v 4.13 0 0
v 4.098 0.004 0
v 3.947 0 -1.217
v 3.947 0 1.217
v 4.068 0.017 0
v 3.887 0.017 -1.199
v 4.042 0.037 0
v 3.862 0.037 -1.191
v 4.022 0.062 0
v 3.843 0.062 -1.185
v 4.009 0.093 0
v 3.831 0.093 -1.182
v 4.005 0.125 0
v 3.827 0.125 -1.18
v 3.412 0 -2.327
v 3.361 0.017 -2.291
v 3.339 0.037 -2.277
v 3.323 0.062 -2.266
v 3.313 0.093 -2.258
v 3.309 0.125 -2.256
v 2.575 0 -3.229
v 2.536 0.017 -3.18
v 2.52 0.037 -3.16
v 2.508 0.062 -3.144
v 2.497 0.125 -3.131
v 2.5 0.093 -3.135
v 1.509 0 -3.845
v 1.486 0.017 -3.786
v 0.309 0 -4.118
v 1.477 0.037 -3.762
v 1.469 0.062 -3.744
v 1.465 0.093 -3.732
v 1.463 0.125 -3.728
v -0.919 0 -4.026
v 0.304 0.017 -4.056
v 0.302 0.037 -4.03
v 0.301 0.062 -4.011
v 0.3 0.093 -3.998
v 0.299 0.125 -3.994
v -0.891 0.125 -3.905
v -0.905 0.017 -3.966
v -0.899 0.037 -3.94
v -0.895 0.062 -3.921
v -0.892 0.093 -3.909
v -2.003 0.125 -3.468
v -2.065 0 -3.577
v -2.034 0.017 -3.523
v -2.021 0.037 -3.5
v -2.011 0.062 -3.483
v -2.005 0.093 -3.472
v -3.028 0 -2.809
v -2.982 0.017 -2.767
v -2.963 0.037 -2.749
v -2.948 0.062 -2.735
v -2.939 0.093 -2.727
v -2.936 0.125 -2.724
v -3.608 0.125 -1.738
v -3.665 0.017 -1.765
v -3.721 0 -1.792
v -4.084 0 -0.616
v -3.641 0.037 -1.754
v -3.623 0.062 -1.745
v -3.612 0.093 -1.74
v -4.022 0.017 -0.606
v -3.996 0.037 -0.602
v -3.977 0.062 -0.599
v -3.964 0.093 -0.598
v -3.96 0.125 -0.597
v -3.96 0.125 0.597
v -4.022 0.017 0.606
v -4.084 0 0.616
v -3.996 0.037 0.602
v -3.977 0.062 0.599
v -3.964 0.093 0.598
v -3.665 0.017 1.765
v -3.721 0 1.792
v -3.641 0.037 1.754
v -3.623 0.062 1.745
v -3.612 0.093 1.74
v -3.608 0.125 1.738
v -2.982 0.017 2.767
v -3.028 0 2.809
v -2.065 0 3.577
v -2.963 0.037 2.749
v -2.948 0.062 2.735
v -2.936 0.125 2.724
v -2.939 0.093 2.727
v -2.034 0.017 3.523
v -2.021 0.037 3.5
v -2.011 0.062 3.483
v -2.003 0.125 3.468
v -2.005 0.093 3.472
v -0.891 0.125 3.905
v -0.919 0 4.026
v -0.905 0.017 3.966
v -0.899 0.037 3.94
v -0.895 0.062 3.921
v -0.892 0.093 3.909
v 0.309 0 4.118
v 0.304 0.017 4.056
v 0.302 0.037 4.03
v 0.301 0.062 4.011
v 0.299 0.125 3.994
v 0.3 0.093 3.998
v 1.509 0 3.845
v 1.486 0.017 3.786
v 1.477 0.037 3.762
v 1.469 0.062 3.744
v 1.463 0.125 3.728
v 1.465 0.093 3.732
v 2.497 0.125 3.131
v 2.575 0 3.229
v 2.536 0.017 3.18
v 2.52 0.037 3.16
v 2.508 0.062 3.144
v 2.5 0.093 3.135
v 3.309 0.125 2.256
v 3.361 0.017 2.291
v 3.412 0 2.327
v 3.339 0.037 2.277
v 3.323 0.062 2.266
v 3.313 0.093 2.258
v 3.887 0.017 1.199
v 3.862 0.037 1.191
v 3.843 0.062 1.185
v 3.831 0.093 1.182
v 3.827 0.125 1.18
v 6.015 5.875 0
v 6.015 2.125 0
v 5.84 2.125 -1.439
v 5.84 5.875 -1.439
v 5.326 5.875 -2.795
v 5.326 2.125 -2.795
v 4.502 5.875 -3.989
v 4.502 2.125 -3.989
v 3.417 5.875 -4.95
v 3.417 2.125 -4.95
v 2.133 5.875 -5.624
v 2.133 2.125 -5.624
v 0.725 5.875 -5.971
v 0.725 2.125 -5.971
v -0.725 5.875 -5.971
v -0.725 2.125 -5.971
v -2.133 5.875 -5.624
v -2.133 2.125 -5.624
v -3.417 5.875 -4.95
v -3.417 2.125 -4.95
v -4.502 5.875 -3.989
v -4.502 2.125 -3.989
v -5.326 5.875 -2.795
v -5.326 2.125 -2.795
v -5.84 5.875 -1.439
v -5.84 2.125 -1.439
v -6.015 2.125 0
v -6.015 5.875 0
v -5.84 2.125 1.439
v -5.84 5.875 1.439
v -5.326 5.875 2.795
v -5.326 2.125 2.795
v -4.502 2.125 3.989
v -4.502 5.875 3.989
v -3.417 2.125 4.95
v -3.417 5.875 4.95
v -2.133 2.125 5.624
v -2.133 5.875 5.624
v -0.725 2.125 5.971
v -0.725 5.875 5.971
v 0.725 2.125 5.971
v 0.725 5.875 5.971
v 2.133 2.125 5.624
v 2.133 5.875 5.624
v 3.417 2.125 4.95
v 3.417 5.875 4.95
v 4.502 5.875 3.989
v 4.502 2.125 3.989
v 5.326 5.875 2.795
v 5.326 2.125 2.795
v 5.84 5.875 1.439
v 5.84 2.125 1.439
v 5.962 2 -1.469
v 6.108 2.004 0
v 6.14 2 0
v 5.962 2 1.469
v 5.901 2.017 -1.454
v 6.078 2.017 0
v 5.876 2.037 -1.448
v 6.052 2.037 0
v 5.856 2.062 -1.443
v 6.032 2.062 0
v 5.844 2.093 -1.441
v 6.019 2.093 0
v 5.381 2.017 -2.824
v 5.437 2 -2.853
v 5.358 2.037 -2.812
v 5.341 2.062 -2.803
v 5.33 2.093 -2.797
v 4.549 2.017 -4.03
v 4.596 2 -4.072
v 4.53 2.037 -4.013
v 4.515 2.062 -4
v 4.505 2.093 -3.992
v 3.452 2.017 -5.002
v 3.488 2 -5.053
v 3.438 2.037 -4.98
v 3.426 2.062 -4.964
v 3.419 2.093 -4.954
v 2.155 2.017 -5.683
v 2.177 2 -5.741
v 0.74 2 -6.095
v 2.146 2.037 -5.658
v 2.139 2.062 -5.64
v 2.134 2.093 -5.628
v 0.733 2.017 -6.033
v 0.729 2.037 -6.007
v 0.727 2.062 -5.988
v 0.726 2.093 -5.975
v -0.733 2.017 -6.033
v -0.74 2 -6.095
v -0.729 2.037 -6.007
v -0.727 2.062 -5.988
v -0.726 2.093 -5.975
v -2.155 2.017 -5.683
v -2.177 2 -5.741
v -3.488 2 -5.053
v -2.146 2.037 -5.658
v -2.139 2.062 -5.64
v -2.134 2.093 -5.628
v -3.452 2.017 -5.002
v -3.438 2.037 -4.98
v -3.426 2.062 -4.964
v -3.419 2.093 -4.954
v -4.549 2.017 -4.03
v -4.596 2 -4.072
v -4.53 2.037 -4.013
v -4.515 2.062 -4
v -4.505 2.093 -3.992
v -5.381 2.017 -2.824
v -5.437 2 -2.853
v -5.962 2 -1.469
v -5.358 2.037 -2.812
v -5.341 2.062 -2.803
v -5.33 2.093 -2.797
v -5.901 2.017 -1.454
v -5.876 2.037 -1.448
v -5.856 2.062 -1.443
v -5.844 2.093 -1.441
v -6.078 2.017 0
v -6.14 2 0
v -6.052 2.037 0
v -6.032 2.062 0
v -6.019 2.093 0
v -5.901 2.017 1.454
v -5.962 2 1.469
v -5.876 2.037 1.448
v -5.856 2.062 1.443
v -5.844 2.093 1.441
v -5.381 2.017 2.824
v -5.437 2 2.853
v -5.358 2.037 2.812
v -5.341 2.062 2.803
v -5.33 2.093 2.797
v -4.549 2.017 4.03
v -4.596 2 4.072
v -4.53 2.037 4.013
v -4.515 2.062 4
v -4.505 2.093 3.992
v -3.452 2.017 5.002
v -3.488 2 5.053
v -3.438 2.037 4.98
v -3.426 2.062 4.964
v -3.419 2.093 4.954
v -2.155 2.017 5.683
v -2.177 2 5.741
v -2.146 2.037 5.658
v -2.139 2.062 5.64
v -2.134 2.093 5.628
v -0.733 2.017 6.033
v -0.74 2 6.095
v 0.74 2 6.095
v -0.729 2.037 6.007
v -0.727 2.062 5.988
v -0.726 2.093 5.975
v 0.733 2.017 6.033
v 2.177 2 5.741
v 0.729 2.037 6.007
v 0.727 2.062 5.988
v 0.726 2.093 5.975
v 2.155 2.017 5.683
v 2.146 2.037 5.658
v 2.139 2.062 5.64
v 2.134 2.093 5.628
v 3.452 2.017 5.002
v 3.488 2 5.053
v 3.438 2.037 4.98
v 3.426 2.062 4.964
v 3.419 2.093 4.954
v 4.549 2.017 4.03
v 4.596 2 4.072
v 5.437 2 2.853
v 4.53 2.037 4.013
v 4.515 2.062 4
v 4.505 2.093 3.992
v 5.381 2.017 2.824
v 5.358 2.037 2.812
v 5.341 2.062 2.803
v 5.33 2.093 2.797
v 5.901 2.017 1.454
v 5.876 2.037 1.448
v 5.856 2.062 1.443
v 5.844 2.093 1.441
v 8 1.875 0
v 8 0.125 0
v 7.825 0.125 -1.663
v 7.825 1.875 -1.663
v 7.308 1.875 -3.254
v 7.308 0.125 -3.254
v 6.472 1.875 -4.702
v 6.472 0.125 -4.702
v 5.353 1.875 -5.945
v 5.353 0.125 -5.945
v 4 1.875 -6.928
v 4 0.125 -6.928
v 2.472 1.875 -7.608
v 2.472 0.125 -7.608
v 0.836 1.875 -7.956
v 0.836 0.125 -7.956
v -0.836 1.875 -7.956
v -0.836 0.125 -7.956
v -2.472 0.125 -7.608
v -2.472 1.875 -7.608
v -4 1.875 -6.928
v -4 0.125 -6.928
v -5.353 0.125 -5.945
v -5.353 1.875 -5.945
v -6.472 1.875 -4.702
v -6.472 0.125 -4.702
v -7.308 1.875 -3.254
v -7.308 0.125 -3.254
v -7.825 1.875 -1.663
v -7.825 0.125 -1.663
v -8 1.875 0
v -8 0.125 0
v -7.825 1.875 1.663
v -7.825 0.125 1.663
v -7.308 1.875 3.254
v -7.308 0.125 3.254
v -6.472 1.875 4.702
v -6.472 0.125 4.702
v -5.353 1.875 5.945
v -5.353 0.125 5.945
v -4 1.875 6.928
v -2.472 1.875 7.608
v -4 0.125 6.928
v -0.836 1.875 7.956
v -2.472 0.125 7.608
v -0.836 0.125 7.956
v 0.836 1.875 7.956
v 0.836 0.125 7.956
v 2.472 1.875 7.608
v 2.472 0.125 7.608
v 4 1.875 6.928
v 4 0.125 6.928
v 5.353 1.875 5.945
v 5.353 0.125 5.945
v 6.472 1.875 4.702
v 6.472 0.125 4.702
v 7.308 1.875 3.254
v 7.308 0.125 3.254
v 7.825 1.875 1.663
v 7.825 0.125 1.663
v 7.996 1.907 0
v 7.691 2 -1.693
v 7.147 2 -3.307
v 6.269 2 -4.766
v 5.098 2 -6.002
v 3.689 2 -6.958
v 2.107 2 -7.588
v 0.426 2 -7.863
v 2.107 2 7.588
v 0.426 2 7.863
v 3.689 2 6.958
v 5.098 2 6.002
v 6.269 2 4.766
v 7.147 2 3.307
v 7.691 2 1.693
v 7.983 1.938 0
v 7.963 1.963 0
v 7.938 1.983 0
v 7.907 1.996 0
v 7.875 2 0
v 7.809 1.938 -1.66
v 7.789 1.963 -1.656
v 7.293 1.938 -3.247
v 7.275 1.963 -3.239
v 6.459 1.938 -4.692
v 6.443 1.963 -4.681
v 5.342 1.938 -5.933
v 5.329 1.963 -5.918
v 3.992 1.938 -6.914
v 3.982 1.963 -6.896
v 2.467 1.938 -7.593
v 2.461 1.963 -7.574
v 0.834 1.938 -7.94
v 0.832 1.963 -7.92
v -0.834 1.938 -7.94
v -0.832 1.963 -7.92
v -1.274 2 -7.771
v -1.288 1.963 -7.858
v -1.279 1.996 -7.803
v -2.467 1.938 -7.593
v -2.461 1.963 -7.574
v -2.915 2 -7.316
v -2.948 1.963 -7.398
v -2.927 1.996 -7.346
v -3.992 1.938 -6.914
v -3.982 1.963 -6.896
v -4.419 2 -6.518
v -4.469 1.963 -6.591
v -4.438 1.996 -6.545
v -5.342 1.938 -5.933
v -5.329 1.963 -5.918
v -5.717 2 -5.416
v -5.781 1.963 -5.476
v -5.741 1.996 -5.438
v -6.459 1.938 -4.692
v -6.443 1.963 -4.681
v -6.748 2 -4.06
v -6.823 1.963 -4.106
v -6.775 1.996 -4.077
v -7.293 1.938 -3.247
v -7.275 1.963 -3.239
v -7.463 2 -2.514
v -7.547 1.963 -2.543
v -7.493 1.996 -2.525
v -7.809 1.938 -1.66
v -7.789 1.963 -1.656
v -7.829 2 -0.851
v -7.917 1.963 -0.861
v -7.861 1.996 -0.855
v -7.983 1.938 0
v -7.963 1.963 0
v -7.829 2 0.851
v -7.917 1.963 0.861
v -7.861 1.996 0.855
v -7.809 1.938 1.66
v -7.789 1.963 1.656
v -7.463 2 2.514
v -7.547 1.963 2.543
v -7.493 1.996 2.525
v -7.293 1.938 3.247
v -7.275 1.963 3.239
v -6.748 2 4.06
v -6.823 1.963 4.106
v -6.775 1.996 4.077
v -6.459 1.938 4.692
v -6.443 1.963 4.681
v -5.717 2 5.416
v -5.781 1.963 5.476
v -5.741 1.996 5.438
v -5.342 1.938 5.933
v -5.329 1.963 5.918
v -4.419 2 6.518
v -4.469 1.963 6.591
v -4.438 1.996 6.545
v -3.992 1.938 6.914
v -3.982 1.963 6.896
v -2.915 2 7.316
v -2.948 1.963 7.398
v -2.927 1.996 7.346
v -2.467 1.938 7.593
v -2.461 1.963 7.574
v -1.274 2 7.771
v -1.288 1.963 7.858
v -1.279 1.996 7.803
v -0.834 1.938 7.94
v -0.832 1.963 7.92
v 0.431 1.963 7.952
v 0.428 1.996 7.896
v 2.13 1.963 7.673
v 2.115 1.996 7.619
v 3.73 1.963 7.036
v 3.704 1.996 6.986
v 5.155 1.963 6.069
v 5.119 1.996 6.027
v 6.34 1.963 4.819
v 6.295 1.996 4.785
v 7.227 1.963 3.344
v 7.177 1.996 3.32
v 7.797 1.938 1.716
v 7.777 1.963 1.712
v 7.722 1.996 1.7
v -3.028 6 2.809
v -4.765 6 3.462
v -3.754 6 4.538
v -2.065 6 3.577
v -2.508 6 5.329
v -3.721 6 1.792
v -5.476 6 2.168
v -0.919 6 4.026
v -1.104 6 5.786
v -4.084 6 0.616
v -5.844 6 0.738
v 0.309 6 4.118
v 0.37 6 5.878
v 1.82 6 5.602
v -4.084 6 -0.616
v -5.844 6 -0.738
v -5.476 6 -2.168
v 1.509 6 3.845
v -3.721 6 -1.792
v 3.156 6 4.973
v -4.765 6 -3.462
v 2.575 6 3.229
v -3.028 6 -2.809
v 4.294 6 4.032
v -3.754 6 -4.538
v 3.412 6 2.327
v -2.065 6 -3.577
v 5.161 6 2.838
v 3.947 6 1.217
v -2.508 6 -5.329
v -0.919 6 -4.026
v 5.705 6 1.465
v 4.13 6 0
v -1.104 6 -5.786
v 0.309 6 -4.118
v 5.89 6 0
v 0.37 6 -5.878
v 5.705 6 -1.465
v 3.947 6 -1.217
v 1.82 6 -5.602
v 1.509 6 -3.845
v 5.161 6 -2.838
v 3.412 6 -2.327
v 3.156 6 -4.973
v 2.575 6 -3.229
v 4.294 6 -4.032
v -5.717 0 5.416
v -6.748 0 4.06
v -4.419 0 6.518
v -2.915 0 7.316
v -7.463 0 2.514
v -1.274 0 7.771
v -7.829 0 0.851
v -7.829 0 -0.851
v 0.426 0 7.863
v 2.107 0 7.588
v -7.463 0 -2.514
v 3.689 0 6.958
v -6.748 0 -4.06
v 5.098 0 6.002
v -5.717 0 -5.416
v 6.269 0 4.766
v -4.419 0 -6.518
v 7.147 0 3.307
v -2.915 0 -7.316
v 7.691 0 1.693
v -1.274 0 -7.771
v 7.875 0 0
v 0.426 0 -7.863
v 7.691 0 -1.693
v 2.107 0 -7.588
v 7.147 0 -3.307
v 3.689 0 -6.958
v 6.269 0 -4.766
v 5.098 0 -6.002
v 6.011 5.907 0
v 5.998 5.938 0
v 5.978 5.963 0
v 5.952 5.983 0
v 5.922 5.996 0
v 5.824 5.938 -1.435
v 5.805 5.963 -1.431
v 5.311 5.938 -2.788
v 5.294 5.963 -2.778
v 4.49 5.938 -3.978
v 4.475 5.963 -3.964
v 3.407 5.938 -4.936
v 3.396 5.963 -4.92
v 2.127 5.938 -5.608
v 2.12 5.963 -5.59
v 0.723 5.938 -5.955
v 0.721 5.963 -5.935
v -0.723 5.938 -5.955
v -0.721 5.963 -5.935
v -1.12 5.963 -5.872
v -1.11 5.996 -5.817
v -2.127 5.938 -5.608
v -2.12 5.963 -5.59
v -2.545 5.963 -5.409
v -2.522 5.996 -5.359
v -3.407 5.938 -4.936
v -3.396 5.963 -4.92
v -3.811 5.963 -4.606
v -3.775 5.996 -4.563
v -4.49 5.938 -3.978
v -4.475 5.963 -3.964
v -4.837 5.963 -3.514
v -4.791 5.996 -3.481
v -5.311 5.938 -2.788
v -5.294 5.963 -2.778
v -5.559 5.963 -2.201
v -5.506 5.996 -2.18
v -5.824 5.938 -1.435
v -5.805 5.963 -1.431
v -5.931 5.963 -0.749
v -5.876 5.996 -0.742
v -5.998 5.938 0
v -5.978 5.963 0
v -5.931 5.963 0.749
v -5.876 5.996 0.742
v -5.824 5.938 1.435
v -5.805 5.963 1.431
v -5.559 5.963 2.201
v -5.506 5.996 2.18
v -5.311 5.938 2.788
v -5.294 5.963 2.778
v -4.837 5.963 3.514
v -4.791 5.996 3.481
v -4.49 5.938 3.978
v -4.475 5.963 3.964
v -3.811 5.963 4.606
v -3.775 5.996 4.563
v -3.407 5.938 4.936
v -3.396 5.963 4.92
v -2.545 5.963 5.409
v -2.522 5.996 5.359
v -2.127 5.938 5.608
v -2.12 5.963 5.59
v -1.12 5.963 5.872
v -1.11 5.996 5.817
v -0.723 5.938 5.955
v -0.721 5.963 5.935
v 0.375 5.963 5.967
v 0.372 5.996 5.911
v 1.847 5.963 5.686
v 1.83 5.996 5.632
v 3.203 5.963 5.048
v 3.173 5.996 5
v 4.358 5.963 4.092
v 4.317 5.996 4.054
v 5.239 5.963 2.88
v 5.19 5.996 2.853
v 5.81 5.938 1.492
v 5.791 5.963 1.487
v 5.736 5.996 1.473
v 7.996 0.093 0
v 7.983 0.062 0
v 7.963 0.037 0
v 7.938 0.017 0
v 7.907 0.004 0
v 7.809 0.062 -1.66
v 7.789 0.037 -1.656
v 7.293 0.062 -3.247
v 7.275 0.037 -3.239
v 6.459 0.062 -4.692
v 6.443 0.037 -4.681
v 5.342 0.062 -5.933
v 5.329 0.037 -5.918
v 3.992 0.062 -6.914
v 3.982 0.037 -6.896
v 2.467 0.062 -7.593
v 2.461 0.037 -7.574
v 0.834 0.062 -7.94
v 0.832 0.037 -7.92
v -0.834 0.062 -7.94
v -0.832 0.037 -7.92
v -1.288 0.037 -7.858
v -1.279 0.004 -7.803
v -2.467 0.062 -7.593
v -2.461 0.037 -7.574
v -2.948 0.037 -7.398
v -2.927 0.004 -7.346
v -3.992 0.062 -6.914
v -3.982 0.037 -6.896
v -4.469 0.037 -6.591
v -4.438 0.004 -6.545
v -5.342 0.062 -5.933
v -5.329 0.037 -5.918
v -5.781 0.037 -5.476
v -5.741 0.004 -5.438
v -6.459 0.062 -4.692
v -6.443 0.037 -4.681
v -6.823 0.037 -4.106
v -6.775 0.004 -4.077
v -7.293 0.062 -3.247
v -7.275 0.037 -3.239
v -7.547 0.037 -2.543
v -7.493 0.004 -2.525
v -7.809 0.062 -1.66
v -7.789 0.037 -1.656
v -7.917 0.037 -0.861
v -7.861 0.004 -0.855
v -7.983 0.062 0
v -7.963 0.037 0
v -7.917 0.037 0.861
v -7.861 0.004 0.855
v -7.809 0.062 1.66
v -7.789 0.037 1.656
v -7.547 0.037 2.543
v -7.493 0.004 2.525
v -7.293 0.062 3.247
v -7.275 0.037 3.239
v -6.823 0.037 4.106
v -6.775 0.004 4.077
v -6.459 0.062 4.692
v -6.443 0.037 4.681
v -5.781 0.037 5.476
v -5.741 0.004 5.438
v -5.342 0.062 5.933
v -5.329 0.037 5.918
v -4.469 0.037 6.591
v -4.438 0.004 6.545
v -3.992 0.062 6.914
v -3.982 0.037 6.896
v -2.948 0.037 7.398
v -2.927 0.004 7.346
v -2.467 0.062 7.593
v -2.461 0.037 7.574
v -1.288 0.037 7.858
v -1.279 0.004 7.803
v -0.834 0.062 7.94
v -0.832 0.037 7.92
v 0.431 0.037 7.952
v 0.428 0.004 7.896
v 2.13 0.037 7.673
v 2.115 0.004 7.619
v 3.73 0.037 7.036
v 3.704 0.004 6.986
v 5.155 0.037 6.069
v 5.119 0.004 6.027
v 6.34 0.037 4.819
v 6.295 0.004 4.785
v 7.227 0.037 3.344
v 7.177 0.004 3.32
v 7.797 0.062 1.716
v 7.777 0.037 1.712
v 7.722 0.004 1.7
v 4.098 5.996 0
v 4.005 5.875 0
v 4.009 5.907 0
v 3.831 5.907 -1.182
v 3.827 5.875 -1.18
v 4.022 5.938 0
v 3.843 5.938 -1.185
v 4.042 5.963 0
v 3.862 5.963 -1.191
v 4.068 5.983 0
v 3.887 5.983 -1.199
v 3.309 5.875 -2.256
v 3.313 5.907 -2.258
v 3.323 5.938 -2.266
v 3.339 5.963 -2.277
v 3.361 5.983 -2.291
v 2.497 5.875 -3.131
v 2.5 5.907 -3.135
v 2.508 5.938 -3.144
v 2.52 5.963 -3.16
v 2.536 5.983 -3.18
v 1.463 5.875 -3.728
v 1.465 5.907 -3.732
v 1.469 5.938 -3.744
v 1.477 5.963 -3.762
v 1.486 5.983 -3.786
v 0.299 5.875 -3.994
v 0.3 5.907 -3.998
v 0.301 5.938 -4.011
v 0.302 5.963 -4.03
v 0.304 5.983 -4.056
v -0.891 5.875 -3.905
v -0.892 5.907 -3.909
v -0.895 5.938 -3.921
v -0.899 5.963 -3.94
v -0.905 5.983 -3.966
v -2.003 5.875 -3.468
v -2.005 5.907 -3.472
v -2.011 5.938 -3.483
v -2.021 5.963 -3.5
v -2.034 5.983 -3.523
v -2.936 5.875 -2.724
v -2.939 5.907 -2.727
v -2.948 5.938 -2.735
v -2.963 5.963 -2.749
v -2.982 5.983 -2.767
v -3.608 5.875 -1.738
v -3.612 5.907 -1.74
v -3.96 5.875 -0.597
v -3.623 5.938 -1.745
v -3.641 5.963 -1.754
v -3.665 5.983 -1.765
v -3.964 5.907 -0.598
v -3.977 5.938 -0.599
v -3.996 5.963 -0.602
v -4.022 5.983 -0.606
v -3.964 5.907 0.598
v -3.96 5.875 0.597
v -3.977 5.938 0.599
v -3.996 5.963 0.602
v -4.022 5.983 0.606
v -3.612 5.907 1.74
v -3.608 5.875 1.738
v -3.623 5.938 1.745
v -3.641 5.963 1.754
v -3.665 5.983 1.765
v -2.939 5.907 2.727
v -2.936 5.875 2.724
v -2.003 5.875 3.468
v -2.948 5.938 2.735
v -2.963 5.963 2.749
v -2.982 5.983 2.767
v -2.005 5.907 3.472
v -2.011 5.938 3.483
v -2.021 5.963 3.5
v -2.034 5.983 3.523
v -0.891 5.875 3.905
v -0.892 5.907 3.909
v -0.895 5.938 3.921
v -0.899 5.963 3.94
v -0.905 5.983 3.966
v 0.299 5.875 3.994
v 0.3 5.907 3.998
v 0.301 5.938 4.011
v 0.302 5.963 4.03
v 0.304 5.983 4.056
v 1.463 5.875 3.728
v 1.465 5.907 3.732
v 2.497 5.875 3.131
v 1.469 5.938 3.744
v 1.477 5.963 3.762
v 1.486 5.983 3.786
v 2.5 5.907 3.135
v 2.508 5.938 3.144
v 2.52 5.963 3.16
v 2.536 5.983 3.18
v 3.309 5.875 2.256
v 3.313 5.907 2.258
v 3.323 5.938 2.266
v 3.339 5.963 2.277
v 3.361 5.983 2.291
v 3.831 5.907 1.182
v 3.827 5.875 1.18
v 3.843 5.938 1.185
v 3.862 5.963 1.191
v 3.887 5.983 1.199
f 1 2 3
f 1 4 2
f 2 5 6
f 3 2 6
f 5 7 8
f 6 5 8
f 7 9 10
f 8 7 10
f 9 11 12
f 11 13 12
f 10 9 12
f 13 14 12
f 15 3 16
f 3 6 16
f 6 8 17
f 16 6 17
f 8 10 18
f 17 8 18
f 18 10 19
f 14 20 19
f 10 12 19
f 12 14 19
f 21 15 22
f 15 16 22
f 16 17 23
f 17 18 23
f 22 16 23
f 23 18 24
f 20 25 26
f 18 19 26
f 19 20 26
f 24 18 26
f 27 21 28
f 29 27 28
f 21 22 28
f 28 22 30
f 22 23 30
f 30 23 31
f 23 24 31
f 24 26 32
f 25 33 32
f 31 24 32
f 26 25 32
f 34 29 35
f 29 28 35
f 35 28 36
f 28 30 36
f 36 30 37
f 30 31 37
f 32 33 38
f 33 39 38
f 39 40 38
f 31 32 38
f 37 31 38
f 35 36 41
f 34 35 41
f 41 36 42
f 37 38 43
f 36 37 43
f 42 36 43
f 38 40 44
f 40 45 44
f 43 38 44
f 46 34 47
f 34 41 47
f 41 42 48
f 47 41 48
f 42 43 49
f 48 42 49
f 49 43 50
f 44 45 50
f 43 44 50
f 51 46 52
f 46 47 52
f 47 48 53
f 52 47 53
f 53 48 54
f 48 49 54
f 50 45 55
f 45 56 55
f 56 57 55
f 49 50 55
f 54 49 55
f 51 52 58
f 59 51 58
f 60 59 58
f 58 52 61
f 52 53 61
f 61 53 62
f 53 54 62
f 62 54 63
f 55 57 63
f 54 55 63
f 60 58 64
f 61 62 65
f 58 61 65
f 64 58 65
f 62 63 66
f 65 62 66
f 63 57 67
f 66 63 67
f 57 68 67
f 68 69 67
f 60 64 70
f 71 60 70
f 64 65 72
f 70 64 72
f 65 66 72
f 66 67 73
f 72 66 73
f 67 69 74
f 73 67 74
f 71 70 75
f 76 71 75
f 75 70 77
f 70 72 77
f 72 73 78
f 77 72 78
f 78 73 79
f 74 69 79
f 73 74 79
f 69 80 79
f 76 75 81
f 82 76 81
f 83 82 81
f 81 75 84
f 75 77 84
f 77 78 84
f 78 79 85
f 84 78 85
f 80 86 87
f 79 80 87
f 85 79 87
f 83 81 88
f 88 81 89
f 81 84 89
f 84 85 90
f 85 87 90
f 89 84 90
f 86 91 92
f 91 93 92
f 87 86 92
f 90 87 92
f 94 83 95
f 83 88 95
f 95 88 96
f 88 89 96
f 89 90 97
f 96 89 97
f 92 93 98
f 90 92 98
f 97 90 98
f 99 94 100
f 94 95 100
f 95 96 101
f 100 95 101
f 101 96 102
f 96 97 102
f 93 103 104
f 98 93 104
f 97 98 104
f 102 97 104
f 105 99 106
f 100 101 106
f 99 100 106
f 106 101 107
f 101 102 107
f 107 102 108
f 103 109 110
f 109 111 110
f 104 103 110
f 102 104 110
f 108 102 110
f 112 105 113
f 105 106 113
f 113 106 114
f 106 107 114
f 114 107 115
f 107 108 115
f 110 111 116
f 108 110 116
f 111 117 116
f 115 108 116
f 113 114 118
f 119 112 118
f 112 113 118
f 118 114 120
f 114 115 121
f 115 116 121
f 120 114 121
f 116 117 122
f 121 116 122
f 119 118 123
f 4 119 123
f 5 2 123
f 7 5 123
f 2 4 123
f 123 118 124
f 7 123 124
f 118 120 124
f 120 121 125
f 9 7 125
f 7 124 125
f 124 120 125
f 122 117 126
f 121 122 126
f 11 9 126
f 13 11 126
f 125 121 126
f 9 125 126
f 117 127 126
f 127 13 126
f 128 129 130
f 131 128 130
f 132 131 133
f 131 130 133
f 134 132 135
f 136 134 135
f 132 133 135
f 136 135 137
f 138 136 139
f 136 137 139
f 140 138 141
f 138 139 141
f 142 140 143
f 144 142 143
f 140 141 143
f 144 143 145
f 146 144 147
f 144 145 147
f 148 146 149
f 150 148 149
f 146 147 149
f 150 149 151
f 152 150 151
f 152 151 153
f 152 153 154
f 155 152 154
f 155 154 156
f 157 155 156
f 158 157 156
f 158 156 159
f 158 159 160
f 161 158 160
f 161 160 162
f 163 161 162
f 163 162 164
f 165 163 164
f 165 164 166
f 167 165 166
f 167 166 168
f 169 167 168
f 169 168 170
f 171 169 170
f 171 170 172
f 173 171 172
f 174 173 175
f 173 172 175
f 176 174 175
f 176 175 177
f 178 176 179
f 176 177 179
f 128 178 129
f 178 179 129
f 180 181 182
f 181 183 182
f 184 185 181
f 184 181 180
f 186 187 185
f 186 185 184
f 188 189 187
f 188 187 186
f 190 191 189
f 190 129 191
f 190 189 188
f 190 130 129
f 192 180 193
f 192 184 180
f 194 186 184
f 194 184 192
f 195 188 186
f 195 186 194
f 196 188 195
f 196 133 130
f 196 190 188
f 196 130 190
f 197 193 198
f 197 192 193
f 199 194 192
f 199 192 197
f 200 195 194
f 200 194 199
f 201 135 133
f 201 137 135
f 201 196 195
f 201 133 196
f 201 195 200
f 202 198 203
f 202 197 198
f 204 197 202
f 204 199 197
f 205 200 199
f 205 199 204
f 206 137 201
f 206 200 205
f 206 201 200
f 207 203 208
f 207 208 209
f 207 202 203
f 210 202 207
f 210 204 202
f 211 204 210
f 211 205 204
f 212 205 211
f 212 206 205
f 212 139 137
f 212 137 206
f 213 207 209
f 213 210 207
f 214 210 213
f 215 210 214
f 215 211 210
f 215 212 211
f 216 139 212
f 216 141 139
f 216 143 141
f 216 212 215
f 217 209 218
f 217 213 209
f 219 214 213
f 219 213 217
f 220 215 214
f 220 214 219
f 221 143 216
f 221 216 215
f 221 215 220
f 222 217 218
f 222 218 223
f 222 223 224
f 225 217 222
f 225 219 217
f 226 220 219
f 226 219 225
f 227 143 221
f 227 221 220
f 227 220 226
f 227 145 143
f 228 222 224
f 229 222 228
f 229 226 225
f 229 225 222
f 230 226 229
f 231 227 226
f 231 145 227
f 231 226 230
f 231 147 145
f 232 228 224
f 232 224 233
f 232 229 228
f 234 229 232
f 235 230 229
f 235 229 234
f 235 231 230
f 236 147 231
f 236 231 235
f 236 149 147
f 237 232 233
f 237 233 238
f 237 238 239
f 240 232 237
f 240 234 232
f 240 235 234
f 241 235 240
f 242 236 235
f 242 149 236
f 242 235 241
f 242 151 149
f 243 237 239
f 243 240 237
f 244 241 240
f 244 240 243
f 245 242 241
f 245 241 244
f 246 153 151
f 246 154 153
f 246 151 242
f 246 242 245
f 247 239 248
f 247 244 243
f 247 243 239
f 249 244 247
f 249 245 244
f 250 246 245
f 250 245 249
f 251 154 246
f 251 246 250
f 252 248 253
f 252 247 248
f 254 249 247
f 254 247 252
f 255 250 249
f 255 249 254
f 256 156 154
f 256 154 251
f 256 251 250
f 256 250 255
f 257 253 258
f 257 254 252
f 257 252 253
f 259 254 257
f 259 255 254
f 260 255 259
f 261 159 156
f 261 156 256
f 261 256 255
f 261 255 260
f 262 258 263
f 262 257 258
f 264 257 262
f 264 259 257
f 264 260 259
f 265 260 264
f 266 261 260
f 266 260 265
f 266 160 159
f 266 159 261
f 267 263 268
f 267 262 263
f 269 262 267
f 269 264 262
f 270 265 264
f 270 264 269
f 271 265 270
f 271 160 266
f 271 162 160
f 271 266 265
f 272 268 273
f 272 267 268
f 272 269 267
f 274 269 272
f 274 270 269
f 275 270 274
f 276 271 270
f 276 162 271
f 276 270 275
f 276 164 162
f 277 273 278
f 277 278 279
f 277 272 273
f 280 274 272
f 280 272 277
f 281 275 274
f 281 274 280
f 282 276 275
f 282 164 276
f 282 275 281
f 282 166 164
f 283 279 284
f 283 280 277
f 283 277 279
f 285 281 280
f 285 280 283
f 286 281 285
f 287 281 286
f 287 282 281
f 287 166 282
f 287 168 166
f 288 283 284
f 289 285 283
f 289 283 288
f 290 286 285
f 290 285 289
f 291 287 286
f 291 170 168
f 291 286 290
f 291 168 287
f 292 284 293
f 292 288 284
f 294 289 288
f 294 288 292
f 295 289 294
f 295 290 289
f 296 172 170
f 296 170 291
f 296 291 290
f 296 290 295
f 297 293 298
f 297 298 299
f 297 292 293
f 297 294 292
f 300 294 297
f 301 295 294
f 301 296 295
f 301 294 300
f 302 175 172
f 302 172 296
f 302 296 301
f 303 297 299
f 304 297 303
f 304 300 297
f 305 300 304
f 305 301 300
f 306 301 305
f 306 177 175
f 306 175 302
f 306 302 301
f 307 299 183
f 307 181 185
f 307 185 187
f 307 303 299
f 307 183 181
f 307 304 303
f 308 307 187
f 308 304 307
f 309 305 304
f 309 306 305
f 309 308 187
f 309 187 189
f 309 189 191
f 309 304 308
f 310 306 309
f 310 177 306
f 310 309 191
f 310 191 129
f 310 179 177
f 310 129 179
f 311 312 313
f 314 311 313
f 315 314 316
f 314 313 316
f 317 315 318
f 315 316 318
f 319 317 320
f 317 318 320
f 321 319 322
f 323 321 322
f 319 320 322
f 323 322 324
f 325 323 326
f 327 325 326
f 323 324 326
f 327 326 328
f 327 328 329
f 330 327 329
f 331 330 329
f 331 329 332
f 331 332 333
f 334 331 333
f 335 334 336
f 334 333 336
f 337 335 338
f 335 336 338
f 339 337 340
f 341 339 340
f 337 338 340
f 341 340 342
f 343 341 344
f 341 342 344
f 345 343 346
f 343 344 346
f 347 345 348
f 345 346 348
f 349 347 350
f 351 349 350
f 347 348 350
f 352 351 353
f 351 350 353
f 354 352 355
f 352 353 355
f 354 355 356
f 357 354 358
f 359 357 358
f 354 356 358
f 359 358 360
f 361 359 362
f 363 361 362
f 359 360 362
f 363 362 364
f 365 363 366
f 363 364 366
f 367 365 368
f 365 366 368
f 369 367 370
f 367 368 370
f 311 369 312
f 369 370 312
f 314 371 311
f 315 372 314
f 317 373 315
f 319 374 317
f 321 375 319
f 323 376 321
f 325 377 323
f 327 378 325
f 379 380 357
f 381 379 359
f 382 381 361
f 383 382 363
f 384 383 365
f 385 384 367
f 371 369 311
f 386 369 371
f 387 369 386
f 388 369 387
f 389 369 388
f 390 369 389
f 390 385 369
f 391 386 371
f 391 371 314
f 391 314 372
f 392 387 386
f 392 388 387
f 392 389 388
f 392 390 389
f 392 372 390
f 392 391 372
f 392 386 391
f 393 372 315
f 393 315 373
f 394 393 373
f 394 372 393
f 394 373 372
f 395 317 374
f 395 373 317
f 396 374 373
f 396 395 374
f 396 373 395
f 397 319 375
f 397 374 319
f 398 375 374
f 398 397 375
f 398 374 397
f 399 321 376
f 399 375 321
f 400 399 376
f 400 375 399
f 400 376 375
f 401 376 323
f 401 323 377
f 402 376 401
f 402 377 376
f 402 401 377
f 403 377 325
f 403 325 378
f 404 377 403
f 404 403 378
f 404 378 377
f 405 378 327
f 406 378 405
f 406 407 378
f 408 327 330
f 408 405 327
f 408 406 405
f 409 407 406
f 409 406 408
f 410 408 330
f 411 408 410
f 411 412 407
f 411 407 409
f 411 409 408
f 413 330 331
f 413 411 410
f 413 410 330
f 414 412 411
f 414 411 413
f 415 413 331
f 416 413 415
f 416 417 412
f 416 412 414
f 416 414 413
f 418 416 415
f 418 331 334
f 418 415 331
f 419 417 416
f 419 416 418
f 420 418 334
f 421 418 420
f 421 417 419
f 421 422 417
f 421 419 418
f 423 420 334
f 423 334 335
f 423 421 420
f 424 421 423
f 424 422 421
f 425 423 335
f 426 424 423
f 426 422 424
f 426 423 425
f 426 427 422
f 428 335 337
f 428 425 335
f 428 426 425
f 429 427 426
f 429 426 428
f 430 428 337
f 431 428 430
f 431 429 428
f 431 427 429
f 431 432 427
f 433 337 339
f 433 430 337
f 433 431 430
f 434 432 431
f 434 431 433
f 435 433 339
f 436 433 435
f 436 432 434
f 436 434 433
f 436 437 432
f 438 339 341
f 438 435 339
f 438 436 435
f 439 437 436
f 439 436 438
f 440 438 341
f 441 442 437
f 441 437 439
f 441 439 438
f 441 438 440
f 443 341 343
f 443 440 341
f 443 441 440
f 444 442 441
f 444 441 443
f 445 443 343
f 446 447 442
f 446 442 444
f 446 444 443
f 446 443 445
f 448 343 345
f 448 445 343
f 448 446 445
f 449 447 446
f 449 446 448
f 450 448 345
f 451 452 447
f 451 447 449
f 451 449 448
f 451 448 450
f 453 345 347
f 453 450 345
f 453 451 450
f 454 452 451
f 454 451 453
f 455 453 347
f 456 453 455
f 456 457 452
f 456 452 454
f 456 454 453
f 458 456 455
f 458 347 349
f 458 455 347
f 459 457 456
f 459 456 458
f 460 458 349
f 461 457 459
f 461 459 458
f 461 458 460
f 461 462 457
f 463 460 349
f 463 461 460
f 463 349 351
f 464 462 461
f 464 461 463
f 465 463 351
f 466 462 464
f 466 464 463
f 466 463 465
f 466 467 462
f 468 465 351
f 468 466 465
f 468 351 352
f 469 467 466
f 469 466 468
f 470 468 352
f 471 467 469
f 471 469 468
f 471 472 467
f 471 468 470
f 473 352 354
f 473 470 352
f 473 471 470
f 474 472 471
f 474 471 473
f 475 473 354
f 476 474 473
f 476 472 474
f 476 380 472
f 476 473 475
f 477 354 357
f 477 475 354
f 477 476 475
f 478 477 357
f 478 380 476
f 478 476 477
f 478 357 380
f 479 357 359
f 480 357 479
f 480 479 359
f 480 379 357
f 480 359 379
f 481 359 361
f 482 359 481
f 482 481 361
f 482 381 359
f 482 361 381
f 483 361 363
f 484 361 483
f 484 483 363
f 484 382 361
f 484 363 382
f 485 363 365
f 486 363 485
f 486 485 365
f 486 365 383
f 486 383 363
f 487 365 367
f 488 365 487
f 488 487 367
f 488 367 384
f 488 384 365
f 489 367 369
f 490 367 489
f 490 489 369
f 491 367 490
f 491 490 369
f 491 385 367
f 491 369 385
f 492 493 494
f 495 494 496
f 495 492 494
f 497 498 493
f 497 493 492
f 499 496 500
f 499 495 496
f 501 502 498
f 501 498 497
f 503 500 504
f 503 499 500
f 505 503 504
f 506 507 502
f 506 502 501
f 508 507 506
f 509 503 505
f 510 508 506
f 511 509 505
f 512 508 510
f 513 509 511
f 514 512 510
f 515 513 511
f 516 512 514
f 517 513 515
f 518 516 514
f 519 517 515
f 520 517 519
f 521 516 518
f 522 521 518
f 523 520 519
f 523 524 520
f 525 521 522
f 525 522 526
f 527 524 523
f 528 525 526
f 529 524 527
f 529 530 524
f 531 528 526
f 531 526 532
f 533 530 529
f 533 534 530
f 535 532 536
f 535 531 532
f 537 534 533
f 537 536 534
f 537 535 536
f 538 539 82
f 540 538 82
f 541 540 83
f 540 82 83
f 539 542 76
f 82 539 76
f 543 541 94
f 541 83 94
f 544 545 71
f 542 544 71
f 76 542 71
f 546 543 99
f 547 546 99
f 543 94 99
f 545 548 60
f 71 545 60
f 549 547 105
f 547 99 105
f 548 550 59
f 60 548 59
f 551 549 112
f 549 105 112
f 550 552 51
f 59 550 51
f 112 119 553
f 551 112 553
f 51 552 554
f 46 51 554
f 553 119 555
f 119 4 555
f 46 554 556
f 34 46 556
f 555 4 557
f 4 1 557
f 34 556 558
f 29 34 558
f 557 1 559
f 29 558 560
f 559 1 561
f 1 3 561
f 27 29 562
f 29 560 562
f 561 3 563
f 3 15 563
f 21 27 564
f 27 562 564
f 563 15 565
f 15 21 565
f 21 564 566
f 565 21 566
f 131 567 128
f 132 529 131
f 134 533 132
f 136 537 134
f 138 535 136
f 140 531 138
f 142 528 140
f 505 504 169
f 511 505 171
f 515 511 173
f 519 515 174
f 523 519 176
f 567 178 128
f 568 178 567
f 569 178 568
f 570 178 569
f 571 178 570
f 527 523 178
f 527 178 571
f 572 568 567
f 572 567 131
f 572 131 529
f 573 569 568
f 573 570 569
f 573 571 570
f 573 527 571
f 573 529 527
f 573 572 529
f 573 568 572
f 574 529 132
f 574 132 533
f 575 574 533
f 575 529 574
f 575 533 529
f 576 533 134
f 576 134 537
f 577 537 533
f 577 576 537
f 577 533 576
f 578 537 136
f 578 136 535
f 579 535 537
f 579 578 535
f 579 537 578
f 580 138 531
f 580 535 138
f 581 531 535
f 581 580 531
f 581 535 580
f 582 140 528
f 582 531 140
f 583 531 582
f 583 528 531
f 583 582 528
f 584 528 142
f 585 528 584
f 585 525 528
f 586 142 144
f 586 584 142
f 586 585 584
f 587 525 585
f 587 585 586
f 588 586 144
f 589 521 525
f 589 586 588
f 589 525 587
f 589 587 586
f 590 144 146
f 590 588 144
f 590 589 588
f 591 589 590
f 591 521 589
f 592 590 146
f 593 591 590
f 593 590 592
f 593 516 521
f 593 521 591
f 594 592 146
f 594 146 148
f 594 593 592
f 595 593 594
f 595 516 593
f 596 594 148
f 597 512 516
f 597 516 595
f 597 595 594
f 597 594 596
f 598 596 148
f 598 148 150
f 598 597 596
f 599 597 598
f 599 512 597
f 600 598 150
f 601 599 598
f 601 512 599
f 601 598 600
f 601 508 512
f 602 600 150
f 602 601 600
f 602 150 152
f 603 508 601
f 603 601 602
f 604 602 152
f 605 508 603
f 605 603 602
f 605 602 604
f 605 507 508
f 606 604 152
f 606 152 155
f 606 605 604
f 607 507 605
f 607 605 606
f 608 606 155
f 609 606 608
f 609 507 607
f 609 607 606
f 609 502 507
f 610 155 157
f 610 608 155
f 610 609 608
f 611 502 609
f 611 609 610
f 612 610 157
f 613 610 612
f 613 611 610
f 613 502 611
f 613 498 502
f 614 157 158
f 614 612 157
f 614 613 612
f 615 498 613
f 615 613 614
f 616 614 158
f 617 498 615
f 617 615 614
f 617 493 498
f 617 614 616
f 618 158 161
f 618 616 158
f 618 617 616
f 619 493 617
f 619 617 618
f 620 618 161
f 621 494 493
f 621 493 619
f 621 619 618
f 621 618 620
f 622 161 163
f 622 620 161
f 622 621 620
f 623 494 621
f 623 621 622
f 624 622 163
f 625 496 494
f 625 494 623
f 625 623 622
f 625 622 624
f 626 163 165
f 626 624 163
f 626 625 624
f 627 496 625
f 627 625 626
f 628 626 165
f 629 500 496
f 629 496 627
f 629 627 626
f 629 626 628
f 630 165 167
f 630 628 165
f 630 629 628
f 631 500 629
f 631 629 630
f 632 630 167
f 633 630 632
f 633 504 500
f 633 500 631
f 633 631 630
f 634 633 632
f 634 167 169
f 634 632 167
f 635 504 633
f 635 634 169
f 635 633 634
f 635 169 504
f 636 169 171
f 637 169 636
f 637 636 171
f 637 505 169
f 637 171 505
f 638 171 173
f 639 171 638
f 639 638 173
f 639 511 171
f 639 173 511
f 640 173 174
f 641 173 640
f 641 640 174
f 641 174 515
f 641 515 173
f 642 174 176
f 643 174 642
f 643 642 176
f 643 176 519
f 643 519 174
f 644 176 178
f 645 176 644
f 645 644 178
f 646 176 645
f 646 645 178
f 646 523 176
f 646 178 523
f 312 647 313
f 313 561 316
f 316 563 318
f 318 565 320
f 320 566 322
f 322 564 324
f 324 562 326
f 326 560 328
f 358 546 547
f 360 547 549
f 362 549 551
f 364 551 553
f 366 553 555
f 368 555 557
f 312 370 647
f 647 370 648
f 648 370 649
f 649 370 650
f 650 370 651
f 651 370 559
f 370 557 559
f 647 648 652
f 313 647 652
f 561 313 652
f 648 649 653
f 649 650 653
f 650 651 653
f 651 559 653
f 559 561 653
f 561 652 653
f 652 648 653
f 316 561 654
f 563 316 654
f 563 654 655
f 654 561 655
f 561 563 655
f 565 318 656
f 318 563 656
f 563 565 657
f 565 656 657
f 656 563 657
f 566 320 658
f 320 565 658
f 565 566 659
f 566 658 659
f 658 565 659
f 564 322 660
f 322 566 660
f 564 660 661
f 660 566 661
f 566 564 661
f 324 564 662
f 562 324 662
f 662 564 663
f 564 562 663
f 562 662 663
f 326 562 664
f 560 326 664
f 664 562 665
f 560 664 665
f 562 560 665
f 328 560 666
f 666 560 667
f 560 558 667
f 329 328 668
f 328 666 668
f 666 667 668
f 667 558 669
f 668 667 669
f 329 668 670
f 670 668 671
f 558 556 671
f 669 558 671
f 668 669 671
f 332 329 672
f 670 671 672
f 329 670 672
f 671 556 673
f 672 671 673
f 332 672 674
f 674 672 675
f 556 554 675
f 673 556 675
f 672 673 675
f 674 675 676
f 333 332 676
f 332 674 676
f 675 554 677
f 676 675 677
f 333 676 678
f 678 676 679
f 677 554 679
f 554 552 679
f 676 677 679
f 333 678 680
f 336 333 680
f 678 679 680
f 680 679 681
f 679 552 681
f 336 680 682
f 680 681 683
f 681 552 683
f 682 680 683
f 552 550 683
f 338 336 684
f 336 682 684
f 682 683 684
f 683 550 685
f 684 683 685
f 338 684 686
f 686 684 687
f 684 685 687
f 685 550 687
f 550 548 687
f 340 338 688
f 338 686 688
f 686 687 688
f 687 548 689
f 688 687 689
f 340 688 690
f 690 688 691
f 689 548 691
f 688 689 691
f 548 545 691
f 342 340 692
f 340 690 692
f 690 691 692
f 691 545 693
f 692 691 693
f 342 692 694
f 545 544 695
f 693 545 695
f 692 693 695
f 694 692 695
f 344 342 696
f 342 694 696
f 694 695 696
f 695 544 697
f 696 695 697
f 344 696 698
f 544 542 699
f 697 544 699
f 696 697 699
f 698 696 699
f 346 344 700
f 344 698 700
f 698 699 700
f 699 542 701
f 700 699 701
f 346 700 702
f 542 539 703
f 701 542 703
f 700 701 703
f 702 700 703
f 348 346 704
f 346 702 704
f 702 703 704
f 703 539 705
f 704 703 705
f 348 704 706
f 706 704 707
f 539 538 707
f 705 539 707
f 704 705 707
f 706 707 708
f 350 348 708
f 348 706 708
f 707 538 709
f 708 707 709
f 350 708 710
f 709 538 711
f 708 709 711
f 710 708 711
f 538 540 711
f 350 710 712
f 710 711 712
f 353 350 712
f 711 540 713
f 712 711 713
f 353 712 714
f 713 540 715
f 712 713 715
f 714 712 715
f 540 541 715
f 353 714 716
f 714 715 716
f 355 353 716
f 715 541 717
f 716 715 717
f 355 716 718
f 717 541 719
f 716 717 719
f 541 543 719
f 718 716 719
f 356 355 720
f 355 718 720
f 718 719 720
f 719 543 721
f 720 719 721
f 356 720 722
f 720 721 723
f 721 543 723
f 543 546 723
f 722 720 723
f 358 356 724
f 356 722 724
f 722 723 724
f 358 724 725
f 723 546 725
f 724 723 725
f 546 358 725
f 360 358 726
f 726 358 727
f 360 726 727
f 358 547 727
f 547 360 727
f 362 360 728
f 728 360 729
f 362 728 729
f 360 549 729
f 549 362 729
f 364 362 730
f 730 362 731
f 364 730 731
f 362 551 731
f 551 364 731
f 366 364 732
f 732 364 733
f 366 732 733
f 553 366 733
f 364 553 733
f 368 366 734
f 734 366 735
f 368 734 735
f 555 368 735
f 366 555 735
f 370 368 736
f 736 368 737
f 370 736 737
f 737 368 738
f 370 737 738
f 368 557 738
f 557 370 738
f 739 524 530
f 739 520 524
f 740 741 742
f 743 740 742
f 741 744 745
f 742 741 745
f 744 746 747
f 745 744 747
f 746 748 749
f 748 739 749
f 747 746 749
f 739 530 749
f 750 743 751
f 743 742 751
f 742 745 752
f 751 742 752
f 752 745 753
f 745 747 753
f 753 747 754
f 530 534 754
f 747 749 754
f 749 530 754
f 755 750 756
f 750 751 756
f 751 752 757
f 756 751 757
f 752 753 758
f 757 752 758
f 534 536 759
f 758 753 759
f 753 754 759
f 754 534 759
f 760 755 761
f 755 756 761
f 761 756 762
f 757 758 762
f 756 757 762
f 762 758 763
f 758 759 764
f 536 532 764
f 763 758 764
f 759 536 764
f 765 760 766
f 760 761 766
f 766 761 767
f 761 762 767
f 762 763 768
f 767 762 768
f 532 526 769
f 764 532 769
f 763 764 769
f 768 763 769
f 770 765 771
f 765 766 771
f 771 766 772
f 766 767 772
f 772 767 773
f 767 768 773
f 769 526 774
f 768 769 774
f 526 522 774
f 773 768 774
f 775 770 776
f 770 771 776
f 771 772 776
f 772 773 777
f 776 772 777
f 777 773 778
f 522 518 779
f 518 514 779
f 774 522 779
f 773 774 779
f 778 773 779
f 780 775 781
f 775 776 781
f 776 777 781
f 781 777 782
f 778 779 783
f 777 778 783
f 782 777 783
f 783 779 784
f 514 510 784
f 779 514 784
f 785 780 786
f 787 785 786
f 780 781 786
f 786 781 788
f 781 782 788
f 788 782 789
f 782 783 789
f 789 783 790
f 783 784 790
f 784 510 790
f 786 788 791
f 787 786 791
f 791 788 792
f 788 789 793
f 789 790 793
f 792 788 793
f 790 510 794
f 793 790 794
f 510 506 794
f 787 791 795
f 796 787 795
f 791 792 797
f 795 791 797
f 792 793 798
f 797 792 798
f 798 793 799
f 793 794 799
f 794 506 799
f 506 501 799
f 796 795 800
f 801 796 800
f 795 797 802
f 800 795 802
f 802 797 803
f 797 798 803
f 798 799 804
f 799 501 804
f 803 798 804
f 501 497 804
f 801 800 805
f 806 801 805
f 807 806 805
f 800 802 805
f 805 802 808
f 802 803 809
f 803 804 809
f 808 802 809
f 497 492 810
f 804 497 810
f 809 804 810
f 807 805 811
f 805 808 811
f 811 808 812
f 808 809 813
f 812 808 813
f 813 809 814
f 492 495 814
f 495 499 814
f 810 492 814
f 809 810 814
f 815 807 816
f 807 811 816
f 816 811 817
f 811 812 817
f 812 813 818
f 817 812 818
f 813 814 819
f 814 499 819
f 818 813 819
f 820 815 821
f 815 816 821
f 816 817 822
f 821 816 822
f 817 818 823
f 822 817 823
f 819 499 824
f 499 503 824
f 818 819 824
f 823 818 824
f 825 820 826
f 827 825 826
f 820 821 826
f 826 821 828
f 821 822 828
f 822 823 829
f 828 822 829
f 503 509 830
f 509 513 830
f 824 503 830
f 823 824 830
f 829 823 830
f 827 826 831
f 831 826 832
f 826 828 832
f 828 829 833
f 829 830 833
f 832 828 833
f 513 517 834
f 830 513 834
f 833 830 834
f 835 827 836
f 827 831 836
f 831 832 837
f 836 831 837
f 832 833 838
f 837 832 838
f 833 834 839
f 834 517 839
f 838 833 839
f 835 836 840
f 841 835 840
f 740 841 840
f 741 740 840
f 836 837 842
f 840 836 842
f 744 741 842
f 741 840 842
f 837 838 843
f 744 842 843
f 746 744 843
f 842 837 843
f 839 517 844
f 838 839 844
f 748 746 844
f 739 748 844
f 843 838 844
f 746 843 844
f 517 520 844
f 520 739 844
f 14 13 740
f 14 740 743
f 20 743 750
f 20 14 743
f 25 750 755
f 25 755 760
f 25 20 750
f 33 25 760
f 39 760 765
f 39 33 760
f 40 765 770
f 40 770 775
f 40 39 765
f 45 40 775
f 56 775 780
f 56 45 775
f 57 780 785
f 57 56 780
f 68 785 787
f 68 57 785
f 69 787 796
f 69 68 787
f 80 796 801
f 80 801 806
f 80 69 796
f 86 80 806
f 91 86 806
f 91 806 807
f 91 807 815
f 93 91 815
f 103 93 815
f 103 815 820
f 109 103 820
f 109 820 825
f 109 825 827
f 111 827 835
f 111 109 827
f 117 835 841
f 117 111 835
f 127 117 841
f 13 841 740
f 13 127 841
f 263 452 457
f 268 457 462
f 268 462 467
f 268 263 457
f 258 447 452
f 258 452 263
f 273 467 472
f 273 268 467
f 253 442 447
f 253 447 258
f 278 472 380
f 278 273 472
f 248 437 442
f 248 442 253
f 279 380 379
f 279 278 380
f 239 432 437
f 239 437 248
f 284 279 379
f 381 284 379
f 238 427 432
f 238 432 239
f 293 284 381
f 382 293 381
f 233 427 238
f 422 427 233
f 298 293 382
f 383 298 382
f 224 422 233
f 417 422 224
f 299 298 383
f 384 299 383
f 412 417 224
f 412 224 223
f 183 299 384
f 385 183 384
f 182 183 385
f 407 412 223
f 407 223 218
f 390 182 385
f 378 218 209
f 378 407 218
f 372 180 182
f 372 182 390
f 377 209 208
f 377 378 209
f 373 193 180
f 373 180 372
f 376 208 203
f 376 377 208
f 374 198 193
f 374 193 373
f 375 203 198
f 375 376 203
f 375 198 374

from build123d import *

# Parameters (mm, degrees)
SKETCH3_R           = 6.015
SKETCH3_R_2         = 4.005
BOSS_EXTRUDE1_DEPTH = 6
SKETCH4_R           = 8
SKETCH4_R_2         = 6.015
BOSS_EXTRUDE2_DEPTH = 2
FILLET1_R           = 0.125


with BuildPart() as part:
    # Sketch3 → Boss-Extrude1 (new body)
    with BuildSketch(Plane(origin=(0, 0, 0), x_dir=(1, 0, 0), z_dir=(0, 1, 0))):
        Circle(SKETCH3_R)
        Circle(SKETCH3_R_2, mode=Mode.SUBTRACT)
    extrude(amount=BOSS_EXTRUDE1_DEPTH)

    # Sketch4 → Boss-Extrude2 (add)
    with BuildSketch(Plane(origin=(0, 0, 0), x_dir=(1, 0, 0), z_dir=(0, 1, 0))):
        Circle(SKETCH4_R)
        Circle(SKETCH4_R_2, mode=Mode.SUBTRACT)
    extrude(amount=BOSS_EXTRUDE2_DEPTH)

    # Fillet1
    fillet1_edges = [part.edges().sort_by_distance(p)[0] for p in [
        (-8, 0, 0),
        (-6.015, 2, 0),
        (-6.015, 6, 0),
        (-4.005, 0, 0),
        (-4.005, 6, 0),
        (-8, 2, 0),
    ]]
    fillet(fillet1_edges, radius=FILLET1_R)


solid = part.part
